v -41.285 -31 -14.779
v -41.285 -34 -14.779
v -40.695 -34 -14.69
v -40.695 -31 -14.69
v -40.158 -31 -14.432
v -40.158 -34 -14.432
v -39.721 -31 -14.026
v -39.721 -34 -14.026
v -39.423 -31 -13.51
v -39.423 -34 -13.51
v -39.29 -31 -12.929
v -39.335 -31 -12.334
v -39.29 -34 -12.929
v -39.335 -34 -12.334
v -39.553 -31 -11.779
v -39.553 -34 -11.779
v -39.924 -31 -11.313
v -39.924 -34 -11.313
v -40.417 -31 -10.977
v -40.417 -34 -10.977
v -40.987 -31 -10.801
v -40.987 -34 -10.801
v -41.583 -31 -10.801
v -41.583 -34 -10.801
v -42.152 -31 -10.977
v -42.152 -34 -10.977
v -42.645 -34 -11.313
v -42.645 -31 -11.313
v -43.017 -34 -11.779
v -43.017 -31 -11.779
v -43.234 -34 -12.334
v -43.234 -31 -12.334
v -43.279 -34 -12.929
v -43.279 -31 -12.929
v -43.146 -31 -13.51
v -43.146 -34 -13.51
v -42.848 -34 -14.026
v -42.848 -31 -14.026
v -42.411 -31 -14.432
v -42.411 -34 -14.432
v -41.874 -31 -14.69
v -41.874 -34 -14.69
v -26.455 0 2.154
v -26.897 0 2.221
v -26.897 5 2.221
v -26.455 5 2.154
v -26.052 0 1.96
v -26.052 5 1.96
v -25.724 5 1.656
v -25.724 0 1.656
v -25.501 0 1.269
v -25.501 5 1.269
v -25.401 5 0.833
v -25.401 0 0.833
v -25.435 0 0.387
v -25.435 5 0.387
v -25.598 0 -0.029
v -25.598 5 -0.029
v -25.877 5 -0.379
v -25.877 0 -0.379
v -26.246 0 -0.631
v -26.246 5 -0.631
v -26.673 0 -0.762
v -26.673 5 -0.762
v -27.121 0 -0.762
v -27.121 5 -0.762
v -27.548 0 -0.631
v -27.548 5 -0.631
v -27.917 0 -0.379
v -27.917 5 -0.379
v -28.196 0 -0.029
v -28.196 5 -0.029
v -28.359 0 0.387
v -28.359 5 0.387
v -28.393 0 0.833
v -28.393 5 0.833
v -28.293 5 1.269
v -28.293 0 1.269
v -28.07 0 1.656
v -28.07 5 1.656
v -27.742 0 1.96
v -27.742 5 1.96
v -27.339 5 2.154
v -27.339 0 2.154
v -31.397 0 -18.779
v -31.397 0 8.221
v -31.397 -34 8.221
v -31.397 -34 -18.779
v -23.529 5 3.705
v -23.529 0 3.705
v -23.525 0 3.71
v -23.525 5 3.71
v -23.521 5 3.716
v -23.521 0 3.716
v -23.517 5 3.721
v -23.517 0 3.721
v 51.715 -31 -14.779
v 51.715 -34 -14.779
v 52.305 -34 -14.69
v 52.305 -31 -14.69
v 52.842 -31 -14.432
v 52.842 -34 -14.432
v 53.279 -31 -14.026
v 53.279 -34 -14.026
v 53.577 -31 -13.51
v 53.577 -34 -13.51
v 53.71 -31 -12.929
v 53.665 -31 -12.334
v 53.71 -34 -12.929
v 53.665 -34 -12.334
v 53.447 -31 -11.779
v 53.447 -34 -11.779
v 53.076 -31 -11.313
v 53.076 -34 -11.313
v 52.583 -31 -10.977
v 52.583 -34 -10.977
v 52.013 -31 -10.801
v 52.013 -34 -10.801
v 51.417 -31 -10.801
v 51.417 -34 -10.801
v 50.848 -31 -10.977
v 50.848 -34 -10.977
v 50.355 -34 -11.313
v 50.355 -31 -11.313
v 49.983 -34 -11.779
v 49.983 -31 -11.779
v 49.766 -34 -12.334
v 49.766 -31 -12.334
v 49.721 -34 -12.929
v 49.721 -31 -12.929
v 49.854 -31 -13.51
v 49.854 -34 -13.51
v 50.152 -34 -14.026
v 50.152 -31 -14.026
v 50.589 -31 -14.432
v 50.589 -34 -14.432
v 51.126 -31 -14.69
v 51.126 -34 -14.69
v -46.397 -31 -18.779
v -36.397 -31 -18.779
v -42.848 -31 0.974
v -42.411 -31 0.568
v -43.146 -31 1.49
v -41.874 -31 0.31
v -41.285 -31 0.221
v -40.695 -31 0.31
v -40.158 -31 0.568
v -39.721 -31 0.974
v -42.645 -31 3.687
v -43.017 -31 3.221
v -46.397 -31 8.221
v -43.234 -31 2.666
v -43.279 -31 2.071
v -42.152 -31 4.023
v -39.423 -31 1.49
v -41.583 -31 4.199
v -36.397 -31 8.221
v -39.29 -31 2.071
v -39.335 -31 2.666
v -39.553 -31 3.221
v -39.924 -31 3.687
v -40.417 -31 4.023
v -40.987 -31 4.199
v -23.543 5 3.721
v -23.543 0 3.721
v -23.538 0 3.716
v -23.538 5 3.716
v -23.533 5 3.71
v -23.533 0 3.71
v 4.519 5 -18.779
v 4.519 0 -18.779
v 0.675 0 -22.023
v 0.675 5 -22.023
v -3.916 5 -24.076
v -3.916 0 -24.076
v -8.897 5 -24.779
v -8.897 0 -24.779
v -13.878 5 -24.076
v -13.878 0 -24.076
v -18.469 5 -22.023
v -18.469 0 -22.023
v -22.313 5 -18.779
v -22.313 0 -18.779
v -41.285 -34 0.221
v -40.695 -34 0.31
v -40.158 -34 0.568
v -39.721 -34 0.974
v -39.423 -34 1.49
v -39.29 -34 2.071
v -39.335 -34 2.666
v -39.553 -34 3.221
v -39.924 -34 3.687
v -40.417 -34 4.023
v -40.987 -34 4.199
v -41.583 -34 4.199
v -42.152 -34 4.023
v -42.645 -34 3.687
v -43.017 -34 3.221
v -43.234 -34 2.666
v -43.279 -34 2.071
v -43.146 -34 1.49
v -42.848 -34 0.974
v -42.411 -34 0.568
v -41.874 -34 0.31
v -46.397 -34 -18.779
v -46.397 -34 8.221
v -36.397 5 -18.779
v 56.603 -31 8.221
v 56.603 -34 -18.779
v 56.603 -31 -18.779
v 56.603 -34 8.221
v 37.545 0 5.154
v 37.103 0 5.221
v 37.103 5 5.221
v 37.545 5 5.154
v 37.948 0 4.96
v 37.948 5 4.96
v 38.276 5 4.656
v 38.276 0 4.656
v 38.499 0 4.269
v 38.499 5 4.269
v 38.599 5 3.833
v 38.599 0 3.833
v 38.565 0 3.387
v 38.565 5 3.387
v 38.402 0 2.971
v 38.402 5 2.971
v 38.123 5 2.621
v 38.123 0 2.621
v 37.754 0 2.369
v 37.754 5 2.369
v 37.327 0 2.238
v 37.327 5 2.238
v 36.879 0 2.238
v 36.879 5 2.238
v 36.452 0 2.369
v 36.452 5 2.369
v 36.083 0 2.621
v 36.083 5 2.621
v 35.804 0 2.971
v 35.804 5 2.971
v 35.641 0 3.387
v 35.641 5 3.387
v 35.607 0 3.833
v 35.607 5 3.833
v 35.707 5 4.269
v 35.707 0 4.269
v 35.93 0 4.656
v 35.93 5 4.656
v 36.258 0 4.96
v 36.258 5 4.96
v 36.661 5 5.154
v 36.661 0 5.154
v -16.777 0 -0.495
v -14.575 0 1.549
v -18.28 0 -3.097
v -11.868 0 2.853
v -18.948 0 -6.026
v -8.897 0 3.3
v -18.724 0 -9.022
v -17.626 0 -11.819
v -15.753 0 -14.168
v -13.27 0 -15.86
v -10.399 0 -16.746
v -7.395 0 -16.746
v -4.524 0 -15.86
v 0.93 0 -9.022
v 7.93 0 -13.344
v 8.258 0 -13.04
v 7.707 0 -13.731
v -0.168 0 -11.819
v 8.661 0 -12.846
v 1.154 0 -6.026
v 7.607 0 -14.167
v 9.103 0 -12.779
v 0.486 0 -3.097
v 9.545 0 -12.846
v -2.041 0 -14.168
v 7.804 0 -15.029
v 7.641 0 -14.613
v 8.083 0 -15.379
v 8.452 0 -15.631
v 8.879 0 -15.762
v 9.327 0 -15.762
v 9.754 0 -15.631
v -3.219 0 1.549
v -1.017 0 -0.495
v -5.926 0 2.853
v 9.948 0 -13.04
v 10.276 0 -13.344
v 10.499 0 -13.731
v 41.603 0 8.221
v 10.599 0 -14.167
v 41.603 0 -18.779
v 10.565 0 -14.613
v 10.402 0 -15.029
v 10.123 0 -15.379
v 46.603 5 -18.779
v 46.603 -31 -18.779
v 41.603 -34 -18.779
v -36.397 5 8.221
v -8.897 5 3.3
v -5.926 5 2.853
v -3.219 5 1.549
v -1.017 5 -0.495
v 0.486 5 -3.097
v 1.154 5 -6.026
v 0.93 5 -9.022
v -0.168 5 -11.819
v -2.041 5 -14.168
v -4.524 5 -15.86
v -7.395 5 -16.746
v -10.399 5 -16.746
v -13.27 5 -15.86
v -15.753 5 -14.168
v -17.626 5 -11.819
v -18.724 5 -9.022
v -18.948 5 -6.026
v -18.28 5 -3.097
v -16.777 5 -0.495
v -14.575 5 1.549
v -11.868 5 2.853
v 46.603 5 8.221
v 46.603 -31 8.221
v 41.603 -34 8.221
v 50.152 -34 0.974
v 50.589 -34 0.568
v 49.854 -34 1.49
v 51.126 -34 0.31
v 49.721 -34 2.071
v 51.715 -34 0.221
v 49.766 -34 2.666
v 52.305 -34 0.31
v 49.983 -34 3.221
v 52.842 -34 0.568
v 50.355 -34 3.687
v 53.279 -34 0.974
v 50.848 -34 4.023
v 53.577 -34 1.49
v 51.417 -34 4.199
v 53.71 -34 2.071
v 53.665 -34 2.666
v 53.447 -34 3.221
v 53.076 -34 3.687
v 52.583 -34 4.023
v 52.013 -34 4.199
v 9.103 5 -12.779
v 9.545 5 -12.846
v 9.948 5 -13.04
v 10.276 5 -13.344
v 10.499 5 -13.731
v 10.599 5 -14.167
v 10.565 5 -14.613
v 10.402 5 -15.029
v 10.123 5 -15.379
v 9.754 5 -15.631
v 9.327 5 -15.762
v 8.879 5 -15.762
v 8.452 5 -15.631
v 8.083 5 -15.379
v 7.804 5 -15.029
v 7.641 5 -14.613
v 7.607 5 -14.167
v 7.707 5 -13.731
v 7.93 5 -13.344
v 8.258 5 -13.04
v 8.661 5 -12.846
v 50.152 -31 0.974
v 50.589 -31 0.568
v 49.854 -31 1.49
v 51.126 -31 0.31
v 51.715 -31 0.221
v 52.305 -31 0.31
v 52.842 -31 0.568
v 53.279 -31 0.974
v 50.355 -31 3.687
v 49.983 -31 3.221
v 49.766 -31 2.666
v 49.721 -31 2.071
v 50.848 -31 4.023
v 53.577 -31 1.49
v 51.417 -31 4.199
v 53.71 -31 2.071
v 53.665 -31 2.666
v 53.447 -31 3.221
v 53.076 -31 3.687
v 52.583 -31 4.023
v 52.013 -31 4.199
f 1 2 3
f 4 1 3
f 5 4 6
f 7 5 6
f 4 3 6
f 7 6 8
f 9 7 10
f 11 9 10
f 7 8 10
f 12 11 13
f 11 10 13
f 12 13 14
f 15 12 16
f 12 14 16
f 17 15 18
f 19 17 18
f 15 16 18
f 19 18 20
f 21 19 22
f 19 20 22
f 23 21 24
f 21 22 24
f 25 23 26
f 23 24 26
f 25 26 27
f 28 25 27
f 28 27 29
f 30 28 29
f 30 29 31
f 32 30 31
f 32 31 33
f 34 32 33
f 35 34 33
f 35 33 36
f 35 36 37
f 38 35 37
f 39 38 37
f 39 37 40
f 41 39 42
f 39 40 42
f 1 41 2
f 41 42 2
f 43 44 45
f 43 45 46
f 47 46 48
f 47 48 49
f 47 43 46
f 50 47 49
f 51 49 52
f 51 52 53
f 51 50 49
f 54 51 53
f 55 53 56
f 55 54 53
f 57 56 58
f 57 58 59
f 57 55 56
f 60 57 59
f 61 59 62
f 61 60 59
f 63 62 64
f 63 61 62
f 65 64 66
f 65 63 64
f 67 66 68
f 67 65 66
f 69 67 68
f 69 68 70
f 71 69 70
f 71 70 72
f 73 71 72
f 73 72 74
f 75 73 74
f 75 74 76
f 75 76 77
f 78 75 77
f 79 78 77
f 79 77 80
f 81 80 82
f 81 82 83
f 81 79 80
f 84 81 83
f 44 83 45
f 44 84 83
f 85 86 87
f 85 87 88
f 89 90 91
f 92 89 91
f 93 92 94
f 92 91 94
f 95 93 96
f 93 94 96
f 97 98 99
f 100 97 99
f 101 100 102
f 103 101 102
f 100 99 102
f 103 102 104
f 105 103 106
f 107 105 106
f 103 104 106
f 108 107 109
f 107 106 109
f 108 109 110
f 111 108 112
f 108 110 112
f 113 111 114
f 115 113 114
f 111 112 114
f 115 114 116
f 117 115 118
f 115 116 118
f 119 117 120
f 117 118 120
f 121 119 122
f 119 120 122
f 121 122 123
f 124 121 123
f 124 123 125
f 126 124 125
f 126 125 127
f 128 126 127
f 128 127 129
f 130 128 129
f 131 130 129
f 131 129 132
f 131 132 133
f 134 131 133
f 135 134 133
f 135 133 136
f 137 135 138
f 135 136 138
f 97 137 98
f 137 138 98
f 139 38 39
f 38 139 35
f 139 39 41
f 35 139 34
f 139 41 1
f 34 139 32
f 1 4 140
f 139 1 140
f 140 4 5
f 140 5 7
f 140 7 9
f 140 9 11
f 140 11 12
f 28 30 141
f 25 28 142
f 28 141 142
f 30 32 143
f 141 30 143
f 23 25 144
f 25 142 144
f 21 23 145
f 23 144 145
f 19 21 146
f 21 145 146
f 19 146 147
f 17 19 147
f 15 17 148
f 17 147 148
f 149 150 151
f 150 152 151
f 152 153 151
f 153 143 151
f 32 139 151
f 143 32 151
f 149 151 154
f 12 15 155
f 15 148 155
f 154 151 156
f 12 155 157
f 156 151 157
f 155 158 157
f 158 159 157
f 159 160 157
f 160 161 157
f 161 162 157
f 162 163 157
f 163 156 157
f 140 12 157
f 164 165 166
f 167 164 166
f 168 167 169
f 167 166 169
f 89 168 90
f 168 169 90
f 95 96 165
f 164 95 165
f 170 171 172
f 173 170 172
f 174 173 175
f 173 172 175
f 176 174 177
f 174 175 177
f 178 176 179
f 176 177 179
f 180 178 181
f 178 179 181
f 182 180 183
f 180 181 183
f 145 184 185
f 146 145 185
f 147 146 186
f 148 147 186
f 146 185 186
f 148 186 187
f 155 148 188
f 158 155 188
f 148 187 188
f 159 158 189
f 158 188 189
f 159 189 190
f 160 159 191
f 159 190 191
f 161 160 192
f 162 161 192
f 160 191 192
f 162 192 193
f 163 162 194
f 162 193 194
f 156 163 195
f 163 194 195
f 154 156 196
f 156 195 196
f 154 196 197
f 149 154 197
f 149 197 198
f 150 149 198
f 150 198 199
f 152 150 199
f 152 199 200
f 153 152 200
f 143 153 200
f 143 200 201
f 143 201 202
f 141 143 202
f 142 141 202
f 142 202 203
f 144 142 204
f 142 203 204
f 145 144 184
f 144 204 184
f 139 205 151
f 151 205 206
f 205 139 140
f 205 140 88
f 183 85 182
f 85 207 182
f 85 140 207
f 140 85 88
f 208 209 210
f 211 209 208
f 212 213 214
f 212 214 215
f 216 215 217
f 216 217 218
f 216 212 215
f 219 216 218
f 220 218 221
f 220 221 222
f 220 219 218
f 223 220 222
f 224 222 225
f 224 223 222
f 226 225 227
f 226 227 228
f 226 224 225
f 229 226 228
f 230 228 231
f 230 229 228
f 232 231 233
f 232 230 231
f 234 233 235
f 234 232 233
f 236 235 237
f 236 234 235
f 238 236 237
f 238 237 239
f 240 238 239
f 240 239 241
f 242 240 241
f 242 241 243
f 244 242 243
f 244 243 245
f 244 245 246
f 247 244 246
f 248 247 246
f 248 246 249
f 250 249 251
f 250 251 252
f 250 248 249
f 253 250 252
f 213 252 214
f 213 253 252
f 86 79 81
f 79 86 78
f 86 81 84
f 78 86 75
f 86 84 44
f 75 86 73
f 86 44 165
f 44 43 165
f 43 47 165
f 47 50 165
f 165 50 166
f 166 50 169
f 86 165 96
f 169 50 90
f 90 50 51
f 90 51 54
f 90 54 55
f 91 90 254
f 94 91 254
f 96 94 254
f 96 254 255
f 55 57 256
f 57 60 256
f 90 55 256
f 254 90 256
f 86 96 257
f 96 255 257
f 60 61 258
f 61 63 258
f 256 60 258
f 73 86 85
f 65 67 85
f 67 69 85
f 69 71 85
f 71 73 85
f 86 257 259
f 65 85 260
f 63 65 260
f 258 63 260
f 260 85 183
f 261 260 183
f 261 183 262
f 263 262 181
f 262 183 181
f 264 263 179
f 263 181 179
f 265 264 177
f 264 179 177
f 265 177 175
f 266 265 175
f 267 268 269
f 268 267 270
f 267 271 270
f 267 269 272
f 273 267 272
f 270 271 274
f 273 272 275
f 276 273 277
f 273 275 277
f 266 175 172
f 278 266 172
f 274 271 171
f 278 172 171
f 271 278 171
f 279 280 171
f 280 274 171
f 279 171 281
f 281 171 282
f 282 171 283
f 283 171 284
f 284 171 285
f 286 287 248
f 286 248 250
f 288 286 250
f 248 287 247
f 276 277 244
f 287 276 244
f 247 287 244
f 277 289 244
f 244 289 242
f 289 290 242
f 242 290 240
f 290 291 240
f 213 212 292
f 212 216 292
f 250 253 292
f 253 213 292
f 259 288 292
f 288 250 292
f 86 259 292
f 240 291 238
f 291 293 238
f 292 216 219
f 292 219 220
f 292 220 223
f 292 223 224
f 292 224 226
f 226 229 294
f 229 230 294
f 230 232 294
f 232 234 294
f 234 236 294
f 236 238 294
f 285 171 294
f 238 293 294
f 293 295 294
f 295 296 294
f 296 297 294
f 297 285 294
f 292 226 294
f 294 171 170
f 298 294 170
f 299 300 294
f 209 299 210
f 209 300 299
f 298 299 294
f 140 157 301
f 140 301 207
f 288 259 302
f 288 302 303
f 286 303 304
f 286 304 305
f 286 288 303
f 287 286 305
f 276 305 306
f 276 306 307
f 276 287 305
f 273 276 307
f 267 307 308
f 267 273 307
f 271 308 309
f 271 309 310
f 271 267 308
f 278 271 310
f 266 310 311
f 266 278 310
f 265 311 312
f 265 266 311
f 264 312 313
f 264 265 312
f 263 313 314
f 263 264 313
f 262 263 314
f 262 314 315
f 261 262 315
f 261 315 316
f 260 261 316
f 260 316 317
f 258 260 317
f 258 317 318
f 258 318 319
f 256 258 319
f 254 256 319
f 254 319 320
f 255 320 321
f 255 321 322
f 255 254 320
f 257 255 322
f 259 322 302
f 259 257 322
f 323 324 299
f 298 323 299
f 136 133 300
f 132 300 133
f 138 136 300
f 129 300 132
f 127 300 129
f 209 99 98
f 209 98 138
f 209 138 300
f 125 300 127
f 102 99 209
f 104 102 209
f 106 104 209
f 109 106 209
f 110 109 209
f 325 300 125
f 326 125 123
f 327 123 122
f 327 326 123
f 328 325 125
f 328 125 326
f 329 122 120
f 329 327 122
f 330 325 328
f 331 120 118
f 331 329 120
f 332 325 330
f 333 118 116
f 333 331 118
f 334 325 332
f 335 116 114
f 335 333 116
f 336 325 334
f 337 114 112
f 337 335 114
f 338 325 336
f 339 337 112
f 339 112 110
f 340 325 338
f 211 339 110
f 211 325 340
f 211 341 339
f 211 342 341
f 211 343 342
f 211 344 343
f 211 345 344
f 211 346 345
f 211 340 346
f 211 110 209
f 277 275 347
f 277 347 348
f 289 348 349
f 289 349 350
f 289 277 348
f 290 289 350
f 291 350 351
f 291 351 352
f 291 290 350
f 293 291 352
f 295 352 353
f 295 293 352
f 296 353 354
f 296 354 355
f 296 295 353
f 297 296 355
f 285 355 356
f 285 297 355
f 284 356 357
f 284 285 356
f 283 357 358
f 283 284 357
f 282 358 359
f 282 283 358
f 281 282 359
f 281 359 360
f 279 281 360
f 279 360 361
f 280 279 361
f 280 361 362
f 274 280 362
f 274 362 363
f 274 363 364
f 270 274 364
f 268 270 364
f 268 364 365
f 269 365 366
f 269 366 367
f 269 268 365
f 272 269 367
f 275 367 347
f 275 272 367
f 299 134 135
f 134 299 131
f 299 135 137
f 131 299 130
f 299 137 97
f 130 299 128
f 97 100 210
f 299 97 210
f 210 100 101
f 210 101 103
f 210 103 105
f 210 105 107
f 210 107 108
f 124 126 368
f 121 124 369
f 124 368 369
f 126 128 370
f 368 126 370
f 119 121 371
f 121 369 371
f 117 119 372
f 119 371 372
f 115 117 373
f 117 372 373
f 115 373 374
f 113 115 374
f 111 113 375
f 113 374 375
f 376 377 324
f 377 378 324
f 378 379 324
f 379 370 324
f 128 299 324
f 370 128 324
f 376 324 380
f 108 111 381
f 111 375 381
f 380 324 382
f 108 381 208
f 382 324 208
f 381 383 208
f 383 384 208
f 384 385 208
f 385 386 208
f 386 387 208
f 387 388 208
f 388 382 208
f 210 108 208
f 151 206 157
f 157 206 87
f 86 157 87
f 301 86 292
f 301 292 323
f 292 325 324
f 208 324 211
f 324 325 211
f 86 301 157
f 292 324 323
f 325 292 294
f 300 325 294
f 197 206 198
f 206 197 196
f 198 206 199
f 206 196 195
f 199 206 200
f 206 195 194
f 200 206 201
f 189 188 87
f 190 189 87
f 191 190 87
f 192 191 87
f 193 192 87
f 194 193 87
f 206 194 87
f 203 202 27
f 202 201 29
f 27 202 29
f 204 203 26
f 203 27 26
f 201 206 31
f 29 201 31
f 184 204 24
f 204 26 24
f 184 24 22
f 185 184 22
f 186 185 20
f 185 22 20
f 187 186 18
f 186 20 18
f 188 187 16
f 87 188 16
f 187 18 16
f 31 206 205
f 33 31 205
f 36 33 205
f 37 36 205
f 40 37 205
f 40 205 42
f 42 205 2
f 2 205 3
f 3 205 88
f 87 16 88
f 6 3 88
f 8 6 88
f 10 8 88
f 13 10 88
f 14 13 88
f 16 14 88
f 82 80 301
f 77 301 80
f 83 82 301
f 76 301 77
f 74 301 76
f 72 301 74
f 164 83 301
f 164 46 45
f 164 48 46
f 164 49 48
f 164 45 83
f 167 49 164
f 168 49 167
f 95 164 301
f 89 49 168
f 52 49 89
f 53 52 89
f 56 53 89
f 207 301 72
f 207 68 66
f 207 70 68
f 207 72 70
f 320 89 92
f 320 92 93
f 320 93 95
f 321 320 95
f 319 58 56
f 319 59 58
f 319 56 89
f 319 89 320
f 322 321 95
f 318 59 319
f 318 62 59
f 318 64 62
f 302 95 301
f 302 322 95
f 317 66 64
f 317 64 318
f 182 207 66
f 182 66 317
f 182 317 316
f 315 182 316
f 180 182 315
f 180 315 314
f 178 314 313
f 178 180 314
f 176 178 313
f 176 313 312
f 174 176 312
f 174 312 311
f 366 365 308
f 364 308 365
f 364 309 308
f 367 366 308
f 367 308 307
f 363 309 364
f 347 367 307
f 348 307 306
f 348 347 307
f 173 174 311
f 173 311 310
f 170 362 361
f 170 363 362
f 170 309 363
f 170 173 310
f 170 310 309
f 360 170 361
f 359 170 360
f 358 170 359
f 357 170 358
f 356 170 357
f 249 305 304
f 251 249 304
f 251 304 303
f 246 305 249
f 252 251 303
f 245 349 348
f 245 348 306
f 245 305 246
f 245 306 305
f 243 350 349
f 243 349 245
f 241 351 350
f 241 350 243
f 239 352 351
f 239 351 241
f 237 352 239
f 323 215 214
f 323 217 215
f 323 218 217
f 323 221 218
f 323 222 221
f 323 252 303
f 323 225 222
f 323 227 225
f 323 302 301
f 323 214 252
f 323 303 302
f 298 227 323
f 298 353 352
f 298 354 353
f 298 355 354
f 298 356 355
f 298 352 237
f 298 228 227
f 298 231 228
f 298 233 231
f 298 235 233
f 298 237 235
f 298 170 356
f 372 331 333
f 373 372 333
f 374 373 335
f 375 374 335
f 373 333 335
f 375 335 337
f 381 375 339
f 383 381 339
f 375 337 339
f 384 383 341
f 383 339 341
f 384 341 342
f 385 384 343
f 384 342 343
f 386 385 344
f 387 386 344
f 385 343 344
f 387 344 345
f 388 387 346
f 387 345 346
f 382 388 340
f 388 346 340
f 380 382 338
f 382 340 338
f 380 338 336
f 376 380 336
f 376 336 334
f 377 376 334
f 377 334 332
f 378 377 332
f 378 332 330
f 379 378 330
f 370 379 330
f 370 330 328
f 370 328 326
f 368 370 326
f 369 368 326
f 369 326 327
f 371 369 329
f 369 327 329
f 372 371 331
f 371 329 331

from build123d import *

# Parameters (mm, degrees)
SKETCH1_R           = 1.5
SKETCH1_R_2         = 10.079418918
BOSS_EXTRUDE1_DEPTH = 5
SKETCH2_W           = 5
SKETCH2_H           = 27
BOSS_EXTRUDE2_DEPTH = 39
SKETCH3_W           = 10
SKETCH3_H           = 27
SKETCH3_R           = 2
BOSS_EXTRUDE3_DEPTH = 3


with BuildPart() as part:
    # Sketch1 → Boss-Extrude1 (new body)
    with BuildSketch(Plane(origin=(0, 0, 0), x_dir=(1, 0, 0), z_dir=(0, 1, 0))):
        with BuildLine():
            Line((41.602990033, 18.779069767), (4.519397898, 18.779069767))
            ThreePointArc((4.519397898, 18.779069767), (-8.897009967, 24.779069767), (-22.313417832, 18.779069767))
            Line((-22.313417832, 18.779069767), (-31.397009967, 18.779069767))
            Line((-31.397009967, 18.779069767), (-31.397009967, -8.220930233))
            Line((-31.397009967, -8.220930233), (41.602990033, -8.220930233))
            Line((41.602990033, -8.220930233), (41.602990033, 18.779069767))
        make_face()
        with BuildLine():
            ThreePointArc((-23.542908001, -3.720930233), (-23.535781037, -3.712942946), (-23.528673093, -3.704938729))
            ThreePointArc((-23.528673093, -3.704938729), (-23.522939474, -3.712936049), (-23.517201484, -3.720930233))
            Line((-23.517201484, -3.720930233), (-23.542908001, -3.720930233))
        make_face(mode=Mode.SUBTRACT)
        with Locations(Location((-26.897009967, -0.720930233, 0), (0, 0, 270))):
            Circle(SKETCH1_R, mode=Mode.SUBTRACT)
        with Locations(Location((37.102990033, -3.720930233, 0), (0, 0, 270))):
            Circle(SKETCH1_R, mode=Mode.SUBTRACT)
        with Locations(Location((-8.897009967, 6.779069767, 0), (0, 0, 270))):
            Circle(SKETCH1_R_2, mode=Mode.SUBTRACT)
        with Locations(Location((9.102990033, 14.279069767, 0), (0, 0, 270))):
            Circle(SKETCH1_R, mode=Mode.SUBTRACT)
    extrude(amount=BOSS_EXTRUDE1_DEPTH)

    # Sketch2 → Boss-Extrude2 (add)
    with BuildSketch(Plane(origin=(0, 5, 0), x_dir=(1, 0, 0), z_dir=(0, 1, 0))):
        with Locations((-33.897009967, 5.279069767)):
            Rectangle(SKETCH2_W, SKETCH2_H)
        with Locations((44.102990033, 5.279069767)):
            Rectangle(SKETCH2_W, SKETCH2_H)
    extrude(amount=-BOSS_EXTRUDE2_DEPTH)

    # Sketch3 → Boss-Extrude3 (add)
    # profile 1 of 2: a face of its own
    with BuildSketch(Plane.XZ.offset(34)):
        with Locations((51.602990033, -5.279069767)):
            Rectangle(SKETCH3_W, SKETCH3_H)
        with Locations(Location((51.715372218, 2.220930233, 0), (0, 0, 270))):
            Circle(SKETCH3_R, mode=Mode.SUBTRACT)
        with Locations(Location((51.715372218, -12.779069767, 0), (0, 0, 270))):
            Circle(SKETCH3_R, mode=Mode.SUBTRACT)
    # profile 2 of 2: a face of its own
    with BuildSketch(Plane.XZ.offset(34)):
        with Locations((-41.397009967, -5.279069767)):
            Rectangle(SKETCH3_W, SKETCH3_H)
        with Locations(Location((-41.284627782, 2.220930233, 0), (0, 0, 270))):
            Circle(SKETCH3_R, mode=Mode.SUBTRACT)
        with Locations(Location((-41.284627782, -12.779069767, 0), (0, 0, 270))):
            Circle(SKETCH3_R, mode=Mode.SUBTRACT)
    extrude(amount=-BOSS_EXTRUDE3_DEPTH)


solid = part.part
